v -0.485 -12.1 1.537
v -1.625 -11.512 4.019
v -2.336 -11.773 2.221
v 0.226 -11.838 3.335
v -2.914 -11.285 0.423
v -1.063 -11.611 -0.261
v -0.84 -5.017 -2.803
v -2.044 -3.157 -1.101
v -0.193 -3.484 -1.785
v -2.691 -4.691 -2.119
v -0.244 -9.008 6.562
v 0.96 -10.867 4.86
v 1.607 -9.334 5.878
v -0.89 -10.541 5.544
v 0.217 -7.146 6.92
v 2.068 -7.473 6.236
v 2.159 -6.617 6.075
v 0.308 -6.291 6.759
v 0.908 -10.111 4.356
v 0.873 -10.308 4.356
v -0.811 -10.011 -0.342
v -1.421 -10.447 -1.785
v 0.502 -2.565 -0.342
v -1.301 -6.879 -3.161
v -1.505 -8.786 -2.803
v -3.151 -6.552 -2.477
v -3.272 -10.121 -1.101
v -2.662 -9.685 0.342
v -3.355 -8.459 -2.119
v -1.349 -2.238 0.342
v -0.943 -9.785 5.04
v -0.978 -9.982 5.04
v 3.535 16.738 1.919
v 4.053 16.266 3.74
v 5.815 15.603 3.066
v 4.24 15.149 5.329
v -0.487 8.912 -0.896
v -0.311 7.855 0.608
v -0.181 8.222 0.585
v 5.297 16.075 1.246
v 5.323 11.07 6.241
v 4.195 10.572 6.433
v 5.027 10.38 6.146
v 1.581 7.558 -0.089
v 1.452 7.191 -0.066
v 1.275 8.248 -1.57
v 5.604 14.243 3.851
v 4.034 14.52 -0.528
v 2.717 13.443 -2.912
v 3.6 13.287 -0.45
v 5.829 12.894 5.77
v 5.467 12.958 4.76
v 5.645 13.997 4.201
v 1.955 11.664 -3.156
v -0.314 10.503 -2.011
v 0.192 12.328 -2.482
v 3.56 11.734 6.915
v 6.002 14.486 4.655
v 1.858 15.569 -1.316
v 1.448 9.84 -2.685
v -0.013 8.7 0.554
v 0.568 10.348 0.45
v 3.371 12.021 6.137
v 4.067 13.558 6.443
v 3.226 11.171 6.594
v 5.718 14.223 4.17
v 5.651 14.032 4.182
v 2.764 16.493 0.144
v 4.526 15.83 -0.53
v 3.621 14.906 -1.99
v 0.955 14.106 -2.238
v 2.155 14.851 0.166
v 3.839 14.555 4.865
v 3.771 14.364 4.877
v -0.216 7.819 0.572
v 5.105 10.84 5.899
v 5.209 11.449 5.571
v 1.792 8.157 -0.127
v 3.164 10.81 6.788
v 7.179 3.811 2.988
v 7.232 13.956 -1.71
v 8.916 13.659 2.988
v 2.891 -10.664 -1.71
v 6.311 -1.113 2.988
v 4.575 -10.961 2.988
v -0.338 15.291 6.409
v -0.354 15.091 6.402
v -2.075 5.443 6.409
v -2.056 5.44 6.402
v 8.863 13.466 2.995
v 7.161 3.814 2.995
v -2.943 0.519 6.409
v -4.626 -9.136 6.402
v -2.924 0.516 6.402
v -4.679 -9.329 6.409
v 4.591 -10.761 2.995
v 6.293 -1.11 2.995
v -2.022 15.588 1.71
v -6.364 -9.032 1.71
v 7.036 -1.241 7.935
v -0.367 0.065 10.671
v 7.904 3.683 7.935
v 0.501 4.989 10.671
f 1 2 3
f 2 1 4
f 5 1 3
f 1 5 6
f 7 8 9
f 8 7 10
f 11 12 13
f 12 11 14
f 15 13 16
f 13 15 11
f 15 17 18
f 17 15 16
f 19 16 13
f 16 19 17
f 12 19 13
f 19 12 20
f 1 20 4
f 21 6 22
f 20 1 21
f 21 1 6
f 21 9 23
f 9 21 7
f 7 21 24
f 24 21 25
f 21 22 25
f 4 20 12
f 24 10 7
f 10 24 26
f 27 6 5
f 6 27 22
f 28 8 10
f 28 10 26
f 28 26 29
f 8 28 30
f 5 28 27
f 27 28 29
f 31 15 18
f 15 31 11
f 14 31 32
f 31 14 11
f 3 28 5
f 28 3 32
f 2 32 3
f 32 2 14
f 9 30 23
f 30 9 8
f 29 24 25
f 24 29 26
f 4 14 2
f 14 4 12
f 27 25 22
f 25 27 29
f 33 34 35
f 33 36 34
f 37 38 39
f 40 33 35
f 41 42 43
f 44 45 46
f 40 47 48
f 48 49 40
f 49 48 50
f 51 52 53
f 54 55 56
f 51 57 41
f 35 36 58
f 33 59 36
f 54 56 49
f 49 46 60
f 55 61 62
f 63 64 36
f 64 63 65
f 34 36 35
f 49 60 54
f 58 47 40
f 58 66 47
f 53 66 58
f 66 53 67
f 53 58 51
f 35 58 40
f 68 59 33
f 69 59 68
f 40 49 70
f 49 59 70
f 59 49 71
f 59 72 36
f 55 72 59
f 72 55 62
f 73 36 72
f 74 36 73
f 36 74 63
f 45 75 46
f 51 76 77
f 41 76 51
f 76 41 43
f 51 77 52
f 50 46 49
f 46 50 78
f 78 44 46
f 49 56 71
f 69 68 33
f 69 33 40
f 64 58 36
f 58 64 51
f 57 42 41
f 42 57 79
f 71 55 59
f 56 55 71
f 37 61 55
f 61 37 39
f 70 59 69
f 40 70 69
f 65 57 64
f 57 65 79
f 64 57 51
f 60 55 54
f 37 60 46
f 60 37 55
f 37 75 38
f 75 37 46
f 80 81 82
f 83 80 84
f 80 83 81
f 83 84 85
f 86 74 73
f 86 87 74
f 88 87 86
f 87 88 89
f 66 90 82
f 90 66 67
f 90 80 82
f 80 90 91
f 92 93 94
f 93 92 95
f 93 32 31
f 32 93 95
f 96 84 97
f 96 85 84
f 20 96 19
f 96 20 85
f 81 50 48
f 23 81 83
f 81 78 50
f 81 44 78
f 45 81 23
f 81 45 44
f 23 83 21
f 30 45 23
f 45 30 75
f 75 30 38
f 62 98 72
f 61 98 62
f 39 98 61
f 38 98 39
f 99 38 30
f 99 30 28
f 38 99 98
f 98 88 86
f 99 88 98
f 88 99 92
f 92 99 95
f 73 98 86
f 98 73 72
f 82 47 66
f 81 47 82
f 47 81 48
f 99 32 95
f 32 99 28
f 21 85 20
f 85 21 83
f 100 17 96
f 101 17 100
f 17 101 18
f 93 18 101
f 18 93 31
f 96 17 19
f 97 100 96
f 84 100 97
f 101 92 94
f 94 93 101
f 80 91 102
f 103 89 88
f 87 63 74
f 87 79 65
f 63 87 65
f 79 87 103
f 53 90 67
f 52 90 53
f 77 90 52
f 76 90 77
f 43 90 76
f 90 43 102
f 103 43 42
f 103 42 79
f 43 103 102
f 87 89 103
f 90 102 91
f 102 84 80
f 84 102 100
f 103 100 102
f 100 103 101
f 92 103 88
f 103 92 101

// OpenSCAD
 //fps = 15
 //steps = 100
 //$t is a time-constant from 0 to .99 and rounds over
 module prism(l, w, h){
    polyhedron(
        points=[[0,0,0], [l,0,0], [l,w,0], [0,w,0], [0+1,w,h], [l-1,w,h]],
        faces=[[0,1,2,3],[5,4,3,2],[0,4,5,1],[0,3,4],[5,2,1]]
    );
}
//preview of the data at hand
echo($t);
echo($vpr);
$vpr = [55+sin(90*$t),0,55+$t*360];//view point angel controller
echo($vpt);
$vpt = [20,0,0];//viepoint offeset (traslate)
//
rotate([0+$t*60*0,20,-10])translate([-5,-10,]){
    translate([5,0,0]){
        color("white")translate([0,3,2])rotate([90,$t*1000,90])cylinder(h=2,d=10,center=true);  
        color("white")translate([0,22,2])rotate([90,$t*720,80])cylinder(h=2,d=10,center=true);  
    }
    color("blue",0.5)cube([10,25,5]);
    color("red",1)translate([0,0,5-0.0999])prism(10,10,5);
    color("red",1)translate([0,25,5-0.0999])prism(10,-10,5);
    CubePoints = [
        [  0,  0,  0 ],  //0
        [ 10,  0,  0 ],  //1
        [ 10,  5, 0 ],  //2
        [  0,  5, 0 ],  //3
        [0+1,  0,  5-.0999 ],  //4
        [10-1,  0,  5-.0999 ],  //5
        [10-1,  5,  5-.0999 ],  //6
        [0+1,  5,  5-.0999 ] //7
    ];
    
    CubeFaces = [
        [0,1,2,3],  // bottom
        [4,5,1,0],  // front
        [7,6,5,4],  // top
        [5,6,2,1],  // right
        [6,7,3,2],  // back
        [7,4,0,3] // left
    ];
    color("red",1)translate([0,10,5])polyhedron( CubePoints, CubeFaces );
}
